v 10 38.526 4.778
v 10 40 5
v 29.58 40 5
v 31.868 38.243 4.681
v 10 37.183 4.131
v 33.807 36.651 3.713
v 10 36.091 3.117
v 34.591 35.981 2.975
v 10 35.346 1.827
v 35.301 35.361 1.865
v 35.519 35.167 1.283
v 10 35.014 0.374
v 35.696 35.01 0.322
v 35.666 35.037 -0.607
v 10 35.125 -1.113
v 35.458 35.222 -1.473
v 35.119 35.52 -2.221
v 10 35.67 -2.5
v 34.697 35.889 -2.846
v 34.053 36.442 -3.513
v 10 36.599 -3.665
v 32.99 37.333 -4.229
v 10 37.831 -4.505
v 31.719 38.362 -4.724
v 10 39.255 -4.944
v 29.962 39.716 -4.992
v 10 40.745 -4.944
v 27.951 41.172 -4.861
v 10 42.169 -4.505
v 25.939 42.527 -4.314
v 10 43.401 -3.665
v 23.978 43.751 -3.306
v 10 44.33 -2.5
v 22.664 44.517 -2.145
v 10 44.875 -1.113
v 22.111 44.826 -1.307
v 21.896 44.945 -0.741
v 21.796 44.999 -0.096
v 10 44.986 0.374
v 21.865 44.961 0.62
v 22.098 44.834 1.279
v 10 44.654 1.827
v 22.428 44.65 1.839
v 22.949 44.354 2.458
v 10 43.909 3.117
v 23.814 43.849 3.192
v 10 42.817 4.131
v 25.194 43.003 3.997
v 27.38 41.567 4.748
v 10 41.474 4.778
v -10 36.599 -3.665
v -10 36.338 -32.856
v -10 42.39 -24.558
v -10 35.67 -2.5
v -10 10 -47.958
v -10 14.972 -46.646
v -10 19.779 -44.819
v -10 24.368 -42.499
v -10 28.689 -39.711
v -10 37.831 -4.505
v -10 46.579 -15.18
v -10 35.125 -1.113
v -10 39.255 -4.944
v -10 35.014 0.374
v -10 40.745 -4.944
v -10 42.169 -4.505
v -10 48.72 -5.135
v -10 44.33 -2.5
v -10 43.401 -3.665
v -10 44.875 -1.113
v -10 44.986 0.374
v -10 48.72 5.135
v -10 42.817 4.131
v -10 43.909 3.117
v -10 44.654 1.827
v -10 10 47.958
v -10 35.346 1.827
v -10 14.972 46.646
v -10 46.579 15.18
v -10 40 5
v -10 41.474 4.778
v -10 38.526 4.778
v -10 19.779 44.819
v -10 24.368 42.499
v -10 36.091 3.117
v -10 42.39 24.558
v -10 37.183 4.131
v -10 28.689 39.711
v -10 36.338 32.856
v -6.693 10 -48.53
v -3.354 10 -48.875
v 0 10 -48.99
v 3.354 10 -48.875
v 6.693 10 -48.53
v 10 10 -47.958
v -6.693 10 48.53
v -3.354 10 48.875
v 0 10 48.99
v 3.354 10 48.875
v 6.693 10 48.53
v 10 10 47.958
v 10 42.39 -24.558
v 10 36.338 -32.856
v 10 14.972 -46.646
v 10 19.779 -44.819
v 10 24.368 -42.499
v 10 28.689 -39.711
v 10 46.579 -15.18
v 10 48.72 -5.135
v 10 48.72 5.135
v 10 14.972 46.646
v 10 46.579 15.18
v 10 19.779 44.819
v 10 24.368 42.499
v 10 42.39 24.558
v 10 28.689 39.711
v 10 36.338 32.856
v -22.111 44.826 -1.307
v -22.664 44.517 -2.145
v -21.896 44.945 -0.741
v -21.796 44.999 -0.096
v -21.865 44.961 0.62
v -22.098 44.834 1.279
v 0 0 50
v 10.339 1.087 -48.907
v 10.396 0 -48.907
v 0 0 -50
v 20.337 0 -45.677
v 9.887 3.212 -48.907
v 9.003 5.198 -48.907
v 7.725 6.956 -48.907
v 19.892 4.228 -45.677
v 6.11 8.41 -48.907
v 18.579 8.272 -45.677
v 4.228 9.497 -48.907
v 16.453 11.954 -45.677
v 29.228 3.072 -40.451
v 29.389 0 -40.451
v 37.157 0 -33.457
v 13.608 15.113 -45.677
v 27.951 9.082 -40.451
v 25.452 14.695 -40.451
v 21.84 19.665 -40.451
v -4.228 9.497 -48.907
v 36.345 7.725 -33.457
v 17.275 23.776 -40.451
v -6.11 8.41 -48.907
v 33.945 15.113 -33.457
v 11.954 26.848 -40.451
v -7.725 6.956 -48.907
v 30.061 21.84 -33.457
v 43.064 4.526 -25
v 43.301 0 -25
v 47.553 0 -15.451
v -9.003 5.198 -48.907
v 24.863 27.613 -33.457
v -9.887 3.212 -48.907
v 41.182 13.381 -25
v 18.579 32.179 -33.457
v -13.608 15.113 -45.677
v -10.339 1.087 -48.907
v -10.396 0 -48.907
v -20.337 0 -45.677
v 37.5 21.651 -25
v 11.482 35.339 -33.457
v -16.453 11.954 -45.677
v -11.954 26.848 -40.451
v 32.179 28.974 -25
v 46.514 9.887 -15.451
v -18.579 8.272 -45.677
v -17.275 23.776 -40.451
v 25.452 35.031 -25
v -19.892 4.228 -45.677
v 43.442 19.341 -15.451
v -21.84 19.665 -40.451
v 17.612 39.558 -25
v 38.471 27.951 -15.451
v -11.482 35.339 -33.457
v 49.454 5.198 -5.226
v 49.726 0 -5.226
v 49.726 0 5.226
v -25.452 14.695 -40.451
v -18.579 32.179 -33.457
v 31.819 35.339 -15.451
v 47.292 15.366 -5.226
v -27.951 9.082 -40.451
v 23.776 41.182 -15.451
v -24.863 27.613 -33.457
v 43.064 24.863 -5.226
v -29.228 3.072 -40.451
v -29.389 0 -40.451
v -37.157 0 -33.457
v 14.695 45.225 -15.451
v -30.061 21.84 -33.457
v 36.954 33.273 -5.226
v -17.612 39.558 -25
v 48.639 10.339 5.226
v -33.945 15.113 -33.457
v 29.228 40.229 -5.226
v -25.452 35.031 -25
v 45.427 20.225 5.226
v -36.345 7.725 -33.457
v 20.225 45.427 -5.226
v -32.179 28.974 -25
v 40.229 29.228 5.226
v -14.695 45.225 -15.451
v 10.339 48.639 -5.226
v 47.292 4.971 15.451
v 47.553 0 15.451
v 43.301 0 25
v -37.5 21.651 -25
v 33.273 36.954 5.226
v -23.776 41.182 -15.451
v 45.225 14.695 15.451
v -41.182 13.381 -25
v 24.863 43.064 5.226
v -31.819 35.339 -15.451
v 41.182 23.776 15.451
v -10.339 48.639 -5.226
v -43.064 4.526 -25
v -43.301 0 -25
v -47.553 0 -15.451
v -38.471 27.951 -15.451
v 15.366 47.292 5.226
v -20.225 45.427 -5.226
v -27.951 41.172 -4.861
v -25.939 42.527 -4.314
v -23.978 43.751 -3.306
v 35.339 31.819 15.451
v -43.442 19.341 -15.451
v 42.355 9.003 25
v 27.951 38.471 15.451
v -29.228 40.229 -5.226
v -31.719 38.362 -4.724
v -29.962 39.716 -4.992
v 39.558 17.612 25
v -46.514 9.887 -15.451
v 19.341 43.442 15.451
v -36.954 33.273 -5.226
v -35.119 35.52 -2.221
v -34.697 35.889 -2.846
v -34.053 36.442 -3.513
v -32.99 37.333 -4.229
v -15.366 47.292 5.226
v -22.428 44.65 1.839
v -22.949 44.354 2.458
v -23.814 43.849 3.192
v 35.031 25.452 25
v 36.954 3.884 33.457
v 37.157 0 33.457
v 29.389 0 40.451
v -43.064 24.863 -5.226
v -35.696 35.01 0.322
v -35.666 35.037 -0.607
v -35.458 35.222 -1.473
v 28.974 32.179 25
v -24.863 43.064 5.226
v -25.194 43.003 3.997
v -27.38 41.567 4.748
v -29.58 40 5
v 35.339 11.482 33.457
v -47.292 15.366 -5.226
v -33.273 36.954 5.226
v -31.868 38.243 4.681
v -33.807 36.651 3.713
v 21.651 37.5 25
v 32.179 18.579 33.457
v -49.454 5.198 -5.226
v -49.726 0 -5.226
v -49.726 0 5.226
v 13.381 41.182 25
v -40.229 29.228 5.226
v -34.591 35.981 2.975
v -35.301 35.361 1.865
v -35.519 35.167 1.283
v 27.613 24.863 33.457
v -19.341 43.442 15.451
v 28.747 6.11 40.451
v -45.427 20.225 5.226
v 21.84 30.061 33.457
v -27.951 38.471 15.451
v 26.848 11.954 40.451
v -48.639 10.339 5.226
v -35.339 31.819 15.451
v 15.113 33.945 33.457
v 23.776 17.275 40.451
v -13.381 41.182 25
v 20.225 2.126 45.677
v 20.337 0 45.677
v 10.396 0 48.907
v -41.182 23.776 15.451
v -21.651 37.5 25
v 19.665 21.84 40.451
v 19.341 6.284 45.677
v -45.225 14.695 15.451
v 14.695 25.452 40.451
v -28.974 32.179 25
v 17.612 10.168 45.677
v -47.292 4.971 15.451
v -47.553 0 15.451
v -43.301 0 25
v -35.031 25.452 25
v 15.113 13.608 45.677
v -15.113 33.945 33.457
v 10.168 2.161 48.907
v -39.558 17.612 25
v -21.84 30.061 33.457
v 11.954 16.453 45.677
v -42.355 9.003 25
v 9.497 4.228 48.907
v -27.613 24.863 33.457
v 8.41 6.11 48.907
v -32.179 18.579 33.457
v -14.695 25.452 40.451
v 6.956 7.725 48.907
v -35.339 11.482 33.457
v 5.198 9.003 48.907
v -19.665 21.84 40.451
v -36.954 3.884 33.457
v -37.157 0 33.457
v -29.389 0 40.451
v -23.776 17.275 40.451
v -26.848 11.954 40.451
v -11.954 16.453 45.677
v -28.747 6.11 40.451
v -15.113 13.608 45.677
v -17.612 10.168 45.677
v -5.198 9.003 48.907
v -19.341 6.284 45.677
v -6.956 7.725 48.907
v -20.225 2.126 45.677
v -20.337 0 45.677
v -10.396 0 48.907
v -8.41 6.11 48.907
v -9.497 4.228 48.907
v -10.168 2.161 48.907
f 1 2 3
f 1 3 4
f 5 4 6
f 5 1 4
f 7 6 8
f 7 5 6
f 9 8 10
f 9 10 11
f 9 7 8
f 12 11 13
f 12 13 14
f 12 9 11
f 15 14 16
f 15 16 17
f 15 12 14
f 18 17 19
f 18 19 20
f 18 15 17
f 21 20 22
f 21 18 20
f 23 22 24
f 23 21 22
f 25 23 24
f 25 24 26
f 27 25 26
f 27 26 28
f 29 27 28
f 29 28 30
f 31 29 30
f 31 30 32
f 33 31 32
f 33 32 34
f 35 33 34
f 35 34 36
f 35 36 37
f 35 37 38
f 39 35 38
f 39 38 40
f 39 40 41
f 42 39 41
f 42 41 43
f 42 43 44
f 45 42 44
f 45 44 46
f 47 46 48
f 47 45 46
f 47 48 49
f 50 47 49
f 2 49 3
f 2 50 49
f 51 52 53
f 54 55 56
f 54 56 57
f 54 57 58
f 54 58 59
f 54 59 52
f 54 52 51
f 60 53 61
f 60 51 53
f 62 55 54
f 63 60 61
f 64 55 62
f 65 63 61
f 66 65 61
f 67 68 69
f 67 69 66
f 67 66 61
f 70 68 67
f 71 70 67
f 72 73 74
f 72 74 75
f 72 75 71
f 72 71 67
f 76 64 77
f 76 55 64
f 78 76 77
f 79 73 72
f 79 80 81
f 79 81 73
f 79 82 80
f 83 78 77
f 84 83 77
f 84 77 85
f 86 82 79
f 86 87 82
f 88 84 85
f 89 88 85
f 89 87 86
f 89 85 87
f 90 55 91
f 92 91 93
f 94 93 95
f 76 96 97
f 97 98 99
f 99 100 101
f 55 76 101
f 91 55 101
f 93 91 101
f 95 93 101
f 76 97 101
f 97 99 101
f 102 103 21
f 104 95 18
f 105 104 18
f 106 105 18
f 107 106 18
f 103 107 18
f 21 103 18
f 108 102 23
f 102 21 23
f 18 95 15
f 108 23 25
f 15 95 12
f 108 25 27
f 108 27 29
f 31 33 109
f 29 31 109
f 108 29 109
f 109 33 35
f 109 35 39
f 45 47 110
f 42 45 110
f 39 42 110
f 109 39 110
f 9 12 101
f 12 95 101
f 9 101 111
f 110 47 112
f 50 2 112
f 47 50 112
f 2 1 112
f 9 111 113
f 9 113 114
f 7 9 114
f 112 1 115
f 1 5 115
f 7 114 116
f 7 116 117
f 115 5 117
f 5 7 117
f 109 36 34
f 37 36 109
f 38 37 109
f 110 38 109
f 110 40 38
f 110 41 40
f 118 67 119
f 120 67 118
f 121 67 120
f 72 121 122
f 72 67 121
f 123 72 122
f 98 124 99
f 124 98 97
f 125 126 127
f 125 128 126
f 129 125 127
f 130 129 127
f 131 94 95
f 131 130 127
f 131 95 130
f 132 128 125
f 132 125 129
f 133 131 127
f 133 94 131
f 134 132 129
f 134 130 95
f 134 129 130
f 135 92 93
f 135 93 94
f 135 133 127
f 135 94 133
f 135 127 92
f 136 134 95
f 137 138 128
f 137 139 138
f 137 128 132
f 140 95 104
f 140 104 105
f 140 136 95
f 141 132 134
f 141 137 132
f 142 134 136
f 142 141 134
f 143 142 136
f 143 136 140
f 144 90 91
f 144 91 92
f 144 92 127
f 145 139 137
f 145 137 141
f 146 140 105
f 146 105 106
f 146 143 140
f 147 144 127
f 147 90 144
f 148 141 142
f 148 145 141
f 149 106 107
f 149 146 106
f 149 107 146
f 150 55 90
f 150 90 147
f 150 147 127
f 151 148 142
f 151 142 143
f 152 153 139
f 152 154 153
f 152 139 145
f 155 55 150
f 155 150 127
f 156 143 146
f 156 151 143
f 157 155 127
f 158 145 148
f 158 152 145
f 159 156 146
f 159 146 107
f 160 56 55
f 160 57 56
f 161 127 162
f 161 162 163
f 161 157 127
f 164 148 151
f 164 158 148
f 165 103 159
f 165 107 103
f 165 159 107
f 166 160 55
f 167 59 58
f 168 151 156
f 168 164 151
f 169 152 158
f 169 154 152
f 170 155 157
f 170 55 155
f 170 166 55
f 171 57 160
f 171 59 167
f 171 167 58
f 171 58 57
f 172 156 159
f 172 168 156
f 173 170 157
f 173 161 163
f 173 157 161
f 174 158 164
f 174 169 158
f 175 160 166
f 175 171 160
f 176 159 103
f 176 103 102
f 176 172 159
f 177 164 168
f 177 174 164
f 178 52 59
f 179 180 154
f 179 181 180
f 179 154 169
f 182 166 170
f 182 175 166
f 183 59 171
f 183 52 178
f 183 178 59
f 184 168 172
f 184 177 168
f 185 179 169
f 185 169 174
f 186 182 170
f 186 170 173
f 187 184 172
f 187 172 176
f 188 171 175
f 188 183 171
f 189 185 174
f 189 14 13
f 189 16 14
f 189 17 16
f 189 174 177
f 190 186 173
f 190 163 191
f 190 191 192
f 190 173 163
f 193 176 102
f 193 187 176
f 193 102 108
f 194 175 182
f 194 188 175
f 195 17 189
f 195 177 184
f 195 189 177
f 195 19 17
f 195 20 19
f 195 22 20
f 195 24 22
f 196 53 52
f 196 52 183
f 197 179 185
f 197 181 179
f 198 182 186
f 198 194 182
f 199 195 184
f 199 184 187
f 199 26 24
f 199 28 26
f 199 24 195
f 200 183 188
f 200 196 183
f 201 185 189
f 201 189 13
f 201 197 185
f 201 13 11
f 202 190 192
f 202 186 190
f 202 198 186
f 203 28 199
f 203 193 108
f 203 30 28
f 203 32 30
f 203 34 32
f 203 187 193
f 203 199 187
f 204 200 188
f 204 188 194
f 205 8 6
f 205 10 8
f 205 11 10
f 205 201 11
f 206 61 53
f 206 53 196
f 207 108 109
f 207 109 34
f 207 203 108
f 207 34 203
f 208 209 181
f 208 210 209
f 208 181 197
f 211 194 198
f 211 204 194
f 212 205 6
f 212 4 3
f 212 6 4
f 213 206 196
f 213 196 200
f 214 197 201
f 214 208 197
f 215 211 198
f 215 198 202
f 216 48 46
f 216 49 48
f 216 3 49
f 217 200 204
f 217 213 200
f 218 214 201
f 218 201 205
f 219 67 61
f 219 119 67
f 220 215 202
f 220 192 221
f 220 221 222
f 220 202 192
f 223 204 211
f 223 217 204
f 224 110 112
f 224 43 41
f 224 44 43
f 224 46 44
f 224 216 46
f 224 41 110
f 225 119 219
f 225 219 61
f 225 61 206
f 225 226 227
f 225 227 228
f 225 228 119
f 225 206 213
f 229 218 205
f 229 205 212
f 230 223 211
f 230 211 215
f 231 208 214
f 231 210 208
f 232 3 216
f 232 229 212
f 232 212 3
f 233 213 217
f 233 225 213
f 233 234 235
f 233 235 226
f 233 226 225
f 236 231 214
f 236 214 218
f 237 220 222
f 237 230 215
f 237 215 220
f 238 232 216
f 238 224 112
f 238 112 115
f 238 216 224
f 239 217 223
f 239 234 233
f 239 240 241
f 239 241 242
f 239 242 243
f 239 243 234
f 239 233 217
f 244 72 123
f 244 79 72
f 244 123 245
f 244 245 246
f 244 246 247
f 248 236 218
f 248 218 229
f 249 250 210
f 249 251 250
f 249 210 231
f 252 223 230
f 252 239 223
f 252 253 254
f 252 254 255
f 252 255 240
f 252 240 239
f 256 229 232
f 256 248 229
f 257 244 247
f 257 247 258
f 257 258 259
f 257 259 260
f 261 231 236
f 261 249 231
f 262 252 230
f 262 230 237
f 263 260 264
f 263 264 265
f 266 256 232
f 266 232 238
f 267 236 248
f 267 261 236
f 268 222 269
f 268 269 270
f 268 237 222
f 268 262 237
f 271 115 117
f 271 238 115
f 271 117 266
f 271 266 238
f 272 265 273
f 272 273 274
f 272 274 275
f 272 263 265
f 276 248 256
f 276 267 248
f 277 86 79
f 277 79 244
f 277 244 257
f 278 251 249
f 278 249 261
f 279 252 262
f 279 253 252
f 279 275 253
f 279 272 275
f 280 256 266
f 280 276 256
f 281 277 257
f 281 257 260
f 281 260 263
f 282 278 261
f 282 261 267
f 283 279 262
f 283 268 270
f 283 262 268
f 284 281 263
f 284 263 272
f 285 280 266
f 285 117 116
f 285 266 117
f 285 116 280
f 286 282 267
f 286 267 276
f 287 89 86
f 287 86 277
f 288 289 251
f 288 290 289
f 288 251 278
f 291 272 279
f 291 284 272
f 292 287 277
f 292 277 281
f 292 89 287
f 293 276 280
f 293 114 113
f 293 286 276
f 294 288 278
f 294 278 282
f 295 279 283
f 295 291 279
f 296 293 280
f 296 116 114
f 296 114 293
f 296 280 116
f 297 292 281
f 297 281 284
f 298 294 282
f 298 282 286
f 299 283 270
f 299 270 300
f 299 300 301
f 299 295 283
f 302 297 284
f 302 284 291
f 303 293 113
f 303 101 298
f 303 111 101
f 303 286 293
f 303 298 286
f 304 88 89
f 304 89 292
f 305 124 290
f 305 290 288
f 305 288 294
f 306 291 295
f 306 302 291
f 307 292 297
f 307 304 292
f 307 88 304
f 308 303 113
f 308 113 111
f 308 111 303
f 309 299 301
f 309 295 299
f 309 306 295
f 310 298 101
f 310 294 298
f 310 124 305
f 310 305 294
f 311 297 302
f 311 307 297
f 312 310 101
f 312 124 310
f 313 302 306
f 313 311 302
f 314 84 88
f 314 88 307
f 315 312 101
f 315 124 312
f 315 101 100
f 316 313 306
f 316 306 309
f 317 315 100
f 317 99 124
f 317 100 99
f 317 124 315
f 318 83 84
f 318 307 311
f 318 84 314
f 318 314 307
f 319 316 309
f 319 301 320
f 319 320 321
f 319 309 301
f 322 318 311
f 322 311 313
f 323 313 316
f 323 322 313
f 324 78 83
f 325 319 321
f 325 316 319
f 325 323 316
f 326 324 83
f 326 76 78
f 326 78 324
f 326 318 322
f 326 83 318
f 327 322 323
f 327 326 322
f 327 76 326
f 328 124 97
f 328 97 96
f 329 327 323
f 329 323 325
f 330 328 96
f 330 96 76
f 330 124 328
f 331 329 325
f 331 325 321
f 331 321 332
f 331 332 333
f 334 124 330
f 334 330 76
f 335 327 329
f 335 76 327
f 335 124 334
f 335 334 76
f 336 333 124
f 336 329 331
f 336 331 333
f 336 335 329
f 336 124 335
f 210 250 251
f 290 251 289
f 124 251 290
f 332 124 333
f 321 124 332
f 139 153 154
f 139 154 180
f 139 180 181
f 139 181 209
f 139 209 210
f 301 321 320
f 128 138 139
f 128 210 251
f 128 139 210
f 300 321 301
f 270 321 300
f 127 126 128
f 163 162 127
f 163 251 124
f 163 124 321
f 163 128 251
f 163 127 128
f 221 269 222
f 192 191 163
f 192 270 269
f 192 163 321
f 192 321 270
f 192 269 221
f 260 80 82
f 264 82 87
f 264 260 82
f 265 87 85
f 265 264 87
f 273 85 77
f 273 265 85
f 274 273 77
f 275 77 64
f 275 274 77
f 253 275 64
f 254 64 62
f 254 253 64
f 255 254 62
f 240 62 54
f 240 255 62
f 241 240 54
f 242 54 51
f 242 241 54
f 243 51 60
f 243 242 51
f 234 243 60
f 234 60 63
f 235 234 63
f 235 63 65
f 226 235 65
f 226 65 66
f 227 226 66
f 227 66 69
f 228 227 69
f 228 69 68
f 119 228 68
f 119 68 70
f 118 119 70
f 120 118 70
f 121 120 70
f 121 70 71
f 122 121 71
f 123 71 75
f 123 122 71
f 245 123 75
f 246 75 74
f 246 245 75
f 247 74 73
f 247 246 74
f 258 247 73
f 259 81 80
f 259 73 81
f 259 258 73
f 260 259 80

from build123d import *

# Parameters (mm, degrees)
REVOLVE1_ANGLE          = 180
SKETCH2_W               = 10
SKETCH2_H               = 40
CUT_EXTRUDE1_DEPTH      = 50
CUT_EXTRUDE2_DEPTH      = 50
CUT_EXTRUDE2_DEPTH_BACK = 50
SKETCH3_R               = 5


with BuildPart() as part:
    # Sketch1 → Revolve1 (revolve)
    with BuildSketch(Plane(origin=(0, 0, 0), x_dir=(1, 0, 0), z_dir=(0, 1, 0))):
        with BuildLine():
            Line((0, -50), (0, 50))
            ThreePointArc((0, 50), (50, 0), (0, -50))
        make_face()
    revolve(axis=Axis((0, 0, 50), (0, 0, 1)), revolution_arc=REVOLVE1_ANGLE)

    # Sketch2 → Cut-Extrude1 (cut, symmetric)
    with BuildSketch(Plane.XY):
        with Locations((5, 30)):
            Rectangle(SKETCH2_W, SKETCH2_H)
    cut_extrude1 = extrude(amount=CUT_EXTRUDE1_DEPTH, both=True, mode=Mode.SUBTRACT)

    # Mirror1: Cut-Extrude1 across plane
    add(cut_extrude1.mirror(Plane(origin=(0, 0, 0), x_dir=(0, 0, 1), z_dir=(1, 0, 0))), mode=Mode.SUBTRACT)

    # Sketch3 → Cut-Extrude2 (cut, two sides: drawn at the far end of the back side and taken through both)
    with BuildSketch(Plane(origin=(0, 0, 0), x_dir=(0, 0, -1), z_dir=(1, 0, 0)).offset(-CUT_EXTRUDE2_DEPTH_BACK)):
        with Locations((0, 40)):
            Circle(SKETCH3_R)
    extrude(amount=CUT_EXTRUDE2_DEPTH + CUT_EXTRUDE2_DEPTH_BACK, mode=Mode.SUBTRACT)


solid = part.part
